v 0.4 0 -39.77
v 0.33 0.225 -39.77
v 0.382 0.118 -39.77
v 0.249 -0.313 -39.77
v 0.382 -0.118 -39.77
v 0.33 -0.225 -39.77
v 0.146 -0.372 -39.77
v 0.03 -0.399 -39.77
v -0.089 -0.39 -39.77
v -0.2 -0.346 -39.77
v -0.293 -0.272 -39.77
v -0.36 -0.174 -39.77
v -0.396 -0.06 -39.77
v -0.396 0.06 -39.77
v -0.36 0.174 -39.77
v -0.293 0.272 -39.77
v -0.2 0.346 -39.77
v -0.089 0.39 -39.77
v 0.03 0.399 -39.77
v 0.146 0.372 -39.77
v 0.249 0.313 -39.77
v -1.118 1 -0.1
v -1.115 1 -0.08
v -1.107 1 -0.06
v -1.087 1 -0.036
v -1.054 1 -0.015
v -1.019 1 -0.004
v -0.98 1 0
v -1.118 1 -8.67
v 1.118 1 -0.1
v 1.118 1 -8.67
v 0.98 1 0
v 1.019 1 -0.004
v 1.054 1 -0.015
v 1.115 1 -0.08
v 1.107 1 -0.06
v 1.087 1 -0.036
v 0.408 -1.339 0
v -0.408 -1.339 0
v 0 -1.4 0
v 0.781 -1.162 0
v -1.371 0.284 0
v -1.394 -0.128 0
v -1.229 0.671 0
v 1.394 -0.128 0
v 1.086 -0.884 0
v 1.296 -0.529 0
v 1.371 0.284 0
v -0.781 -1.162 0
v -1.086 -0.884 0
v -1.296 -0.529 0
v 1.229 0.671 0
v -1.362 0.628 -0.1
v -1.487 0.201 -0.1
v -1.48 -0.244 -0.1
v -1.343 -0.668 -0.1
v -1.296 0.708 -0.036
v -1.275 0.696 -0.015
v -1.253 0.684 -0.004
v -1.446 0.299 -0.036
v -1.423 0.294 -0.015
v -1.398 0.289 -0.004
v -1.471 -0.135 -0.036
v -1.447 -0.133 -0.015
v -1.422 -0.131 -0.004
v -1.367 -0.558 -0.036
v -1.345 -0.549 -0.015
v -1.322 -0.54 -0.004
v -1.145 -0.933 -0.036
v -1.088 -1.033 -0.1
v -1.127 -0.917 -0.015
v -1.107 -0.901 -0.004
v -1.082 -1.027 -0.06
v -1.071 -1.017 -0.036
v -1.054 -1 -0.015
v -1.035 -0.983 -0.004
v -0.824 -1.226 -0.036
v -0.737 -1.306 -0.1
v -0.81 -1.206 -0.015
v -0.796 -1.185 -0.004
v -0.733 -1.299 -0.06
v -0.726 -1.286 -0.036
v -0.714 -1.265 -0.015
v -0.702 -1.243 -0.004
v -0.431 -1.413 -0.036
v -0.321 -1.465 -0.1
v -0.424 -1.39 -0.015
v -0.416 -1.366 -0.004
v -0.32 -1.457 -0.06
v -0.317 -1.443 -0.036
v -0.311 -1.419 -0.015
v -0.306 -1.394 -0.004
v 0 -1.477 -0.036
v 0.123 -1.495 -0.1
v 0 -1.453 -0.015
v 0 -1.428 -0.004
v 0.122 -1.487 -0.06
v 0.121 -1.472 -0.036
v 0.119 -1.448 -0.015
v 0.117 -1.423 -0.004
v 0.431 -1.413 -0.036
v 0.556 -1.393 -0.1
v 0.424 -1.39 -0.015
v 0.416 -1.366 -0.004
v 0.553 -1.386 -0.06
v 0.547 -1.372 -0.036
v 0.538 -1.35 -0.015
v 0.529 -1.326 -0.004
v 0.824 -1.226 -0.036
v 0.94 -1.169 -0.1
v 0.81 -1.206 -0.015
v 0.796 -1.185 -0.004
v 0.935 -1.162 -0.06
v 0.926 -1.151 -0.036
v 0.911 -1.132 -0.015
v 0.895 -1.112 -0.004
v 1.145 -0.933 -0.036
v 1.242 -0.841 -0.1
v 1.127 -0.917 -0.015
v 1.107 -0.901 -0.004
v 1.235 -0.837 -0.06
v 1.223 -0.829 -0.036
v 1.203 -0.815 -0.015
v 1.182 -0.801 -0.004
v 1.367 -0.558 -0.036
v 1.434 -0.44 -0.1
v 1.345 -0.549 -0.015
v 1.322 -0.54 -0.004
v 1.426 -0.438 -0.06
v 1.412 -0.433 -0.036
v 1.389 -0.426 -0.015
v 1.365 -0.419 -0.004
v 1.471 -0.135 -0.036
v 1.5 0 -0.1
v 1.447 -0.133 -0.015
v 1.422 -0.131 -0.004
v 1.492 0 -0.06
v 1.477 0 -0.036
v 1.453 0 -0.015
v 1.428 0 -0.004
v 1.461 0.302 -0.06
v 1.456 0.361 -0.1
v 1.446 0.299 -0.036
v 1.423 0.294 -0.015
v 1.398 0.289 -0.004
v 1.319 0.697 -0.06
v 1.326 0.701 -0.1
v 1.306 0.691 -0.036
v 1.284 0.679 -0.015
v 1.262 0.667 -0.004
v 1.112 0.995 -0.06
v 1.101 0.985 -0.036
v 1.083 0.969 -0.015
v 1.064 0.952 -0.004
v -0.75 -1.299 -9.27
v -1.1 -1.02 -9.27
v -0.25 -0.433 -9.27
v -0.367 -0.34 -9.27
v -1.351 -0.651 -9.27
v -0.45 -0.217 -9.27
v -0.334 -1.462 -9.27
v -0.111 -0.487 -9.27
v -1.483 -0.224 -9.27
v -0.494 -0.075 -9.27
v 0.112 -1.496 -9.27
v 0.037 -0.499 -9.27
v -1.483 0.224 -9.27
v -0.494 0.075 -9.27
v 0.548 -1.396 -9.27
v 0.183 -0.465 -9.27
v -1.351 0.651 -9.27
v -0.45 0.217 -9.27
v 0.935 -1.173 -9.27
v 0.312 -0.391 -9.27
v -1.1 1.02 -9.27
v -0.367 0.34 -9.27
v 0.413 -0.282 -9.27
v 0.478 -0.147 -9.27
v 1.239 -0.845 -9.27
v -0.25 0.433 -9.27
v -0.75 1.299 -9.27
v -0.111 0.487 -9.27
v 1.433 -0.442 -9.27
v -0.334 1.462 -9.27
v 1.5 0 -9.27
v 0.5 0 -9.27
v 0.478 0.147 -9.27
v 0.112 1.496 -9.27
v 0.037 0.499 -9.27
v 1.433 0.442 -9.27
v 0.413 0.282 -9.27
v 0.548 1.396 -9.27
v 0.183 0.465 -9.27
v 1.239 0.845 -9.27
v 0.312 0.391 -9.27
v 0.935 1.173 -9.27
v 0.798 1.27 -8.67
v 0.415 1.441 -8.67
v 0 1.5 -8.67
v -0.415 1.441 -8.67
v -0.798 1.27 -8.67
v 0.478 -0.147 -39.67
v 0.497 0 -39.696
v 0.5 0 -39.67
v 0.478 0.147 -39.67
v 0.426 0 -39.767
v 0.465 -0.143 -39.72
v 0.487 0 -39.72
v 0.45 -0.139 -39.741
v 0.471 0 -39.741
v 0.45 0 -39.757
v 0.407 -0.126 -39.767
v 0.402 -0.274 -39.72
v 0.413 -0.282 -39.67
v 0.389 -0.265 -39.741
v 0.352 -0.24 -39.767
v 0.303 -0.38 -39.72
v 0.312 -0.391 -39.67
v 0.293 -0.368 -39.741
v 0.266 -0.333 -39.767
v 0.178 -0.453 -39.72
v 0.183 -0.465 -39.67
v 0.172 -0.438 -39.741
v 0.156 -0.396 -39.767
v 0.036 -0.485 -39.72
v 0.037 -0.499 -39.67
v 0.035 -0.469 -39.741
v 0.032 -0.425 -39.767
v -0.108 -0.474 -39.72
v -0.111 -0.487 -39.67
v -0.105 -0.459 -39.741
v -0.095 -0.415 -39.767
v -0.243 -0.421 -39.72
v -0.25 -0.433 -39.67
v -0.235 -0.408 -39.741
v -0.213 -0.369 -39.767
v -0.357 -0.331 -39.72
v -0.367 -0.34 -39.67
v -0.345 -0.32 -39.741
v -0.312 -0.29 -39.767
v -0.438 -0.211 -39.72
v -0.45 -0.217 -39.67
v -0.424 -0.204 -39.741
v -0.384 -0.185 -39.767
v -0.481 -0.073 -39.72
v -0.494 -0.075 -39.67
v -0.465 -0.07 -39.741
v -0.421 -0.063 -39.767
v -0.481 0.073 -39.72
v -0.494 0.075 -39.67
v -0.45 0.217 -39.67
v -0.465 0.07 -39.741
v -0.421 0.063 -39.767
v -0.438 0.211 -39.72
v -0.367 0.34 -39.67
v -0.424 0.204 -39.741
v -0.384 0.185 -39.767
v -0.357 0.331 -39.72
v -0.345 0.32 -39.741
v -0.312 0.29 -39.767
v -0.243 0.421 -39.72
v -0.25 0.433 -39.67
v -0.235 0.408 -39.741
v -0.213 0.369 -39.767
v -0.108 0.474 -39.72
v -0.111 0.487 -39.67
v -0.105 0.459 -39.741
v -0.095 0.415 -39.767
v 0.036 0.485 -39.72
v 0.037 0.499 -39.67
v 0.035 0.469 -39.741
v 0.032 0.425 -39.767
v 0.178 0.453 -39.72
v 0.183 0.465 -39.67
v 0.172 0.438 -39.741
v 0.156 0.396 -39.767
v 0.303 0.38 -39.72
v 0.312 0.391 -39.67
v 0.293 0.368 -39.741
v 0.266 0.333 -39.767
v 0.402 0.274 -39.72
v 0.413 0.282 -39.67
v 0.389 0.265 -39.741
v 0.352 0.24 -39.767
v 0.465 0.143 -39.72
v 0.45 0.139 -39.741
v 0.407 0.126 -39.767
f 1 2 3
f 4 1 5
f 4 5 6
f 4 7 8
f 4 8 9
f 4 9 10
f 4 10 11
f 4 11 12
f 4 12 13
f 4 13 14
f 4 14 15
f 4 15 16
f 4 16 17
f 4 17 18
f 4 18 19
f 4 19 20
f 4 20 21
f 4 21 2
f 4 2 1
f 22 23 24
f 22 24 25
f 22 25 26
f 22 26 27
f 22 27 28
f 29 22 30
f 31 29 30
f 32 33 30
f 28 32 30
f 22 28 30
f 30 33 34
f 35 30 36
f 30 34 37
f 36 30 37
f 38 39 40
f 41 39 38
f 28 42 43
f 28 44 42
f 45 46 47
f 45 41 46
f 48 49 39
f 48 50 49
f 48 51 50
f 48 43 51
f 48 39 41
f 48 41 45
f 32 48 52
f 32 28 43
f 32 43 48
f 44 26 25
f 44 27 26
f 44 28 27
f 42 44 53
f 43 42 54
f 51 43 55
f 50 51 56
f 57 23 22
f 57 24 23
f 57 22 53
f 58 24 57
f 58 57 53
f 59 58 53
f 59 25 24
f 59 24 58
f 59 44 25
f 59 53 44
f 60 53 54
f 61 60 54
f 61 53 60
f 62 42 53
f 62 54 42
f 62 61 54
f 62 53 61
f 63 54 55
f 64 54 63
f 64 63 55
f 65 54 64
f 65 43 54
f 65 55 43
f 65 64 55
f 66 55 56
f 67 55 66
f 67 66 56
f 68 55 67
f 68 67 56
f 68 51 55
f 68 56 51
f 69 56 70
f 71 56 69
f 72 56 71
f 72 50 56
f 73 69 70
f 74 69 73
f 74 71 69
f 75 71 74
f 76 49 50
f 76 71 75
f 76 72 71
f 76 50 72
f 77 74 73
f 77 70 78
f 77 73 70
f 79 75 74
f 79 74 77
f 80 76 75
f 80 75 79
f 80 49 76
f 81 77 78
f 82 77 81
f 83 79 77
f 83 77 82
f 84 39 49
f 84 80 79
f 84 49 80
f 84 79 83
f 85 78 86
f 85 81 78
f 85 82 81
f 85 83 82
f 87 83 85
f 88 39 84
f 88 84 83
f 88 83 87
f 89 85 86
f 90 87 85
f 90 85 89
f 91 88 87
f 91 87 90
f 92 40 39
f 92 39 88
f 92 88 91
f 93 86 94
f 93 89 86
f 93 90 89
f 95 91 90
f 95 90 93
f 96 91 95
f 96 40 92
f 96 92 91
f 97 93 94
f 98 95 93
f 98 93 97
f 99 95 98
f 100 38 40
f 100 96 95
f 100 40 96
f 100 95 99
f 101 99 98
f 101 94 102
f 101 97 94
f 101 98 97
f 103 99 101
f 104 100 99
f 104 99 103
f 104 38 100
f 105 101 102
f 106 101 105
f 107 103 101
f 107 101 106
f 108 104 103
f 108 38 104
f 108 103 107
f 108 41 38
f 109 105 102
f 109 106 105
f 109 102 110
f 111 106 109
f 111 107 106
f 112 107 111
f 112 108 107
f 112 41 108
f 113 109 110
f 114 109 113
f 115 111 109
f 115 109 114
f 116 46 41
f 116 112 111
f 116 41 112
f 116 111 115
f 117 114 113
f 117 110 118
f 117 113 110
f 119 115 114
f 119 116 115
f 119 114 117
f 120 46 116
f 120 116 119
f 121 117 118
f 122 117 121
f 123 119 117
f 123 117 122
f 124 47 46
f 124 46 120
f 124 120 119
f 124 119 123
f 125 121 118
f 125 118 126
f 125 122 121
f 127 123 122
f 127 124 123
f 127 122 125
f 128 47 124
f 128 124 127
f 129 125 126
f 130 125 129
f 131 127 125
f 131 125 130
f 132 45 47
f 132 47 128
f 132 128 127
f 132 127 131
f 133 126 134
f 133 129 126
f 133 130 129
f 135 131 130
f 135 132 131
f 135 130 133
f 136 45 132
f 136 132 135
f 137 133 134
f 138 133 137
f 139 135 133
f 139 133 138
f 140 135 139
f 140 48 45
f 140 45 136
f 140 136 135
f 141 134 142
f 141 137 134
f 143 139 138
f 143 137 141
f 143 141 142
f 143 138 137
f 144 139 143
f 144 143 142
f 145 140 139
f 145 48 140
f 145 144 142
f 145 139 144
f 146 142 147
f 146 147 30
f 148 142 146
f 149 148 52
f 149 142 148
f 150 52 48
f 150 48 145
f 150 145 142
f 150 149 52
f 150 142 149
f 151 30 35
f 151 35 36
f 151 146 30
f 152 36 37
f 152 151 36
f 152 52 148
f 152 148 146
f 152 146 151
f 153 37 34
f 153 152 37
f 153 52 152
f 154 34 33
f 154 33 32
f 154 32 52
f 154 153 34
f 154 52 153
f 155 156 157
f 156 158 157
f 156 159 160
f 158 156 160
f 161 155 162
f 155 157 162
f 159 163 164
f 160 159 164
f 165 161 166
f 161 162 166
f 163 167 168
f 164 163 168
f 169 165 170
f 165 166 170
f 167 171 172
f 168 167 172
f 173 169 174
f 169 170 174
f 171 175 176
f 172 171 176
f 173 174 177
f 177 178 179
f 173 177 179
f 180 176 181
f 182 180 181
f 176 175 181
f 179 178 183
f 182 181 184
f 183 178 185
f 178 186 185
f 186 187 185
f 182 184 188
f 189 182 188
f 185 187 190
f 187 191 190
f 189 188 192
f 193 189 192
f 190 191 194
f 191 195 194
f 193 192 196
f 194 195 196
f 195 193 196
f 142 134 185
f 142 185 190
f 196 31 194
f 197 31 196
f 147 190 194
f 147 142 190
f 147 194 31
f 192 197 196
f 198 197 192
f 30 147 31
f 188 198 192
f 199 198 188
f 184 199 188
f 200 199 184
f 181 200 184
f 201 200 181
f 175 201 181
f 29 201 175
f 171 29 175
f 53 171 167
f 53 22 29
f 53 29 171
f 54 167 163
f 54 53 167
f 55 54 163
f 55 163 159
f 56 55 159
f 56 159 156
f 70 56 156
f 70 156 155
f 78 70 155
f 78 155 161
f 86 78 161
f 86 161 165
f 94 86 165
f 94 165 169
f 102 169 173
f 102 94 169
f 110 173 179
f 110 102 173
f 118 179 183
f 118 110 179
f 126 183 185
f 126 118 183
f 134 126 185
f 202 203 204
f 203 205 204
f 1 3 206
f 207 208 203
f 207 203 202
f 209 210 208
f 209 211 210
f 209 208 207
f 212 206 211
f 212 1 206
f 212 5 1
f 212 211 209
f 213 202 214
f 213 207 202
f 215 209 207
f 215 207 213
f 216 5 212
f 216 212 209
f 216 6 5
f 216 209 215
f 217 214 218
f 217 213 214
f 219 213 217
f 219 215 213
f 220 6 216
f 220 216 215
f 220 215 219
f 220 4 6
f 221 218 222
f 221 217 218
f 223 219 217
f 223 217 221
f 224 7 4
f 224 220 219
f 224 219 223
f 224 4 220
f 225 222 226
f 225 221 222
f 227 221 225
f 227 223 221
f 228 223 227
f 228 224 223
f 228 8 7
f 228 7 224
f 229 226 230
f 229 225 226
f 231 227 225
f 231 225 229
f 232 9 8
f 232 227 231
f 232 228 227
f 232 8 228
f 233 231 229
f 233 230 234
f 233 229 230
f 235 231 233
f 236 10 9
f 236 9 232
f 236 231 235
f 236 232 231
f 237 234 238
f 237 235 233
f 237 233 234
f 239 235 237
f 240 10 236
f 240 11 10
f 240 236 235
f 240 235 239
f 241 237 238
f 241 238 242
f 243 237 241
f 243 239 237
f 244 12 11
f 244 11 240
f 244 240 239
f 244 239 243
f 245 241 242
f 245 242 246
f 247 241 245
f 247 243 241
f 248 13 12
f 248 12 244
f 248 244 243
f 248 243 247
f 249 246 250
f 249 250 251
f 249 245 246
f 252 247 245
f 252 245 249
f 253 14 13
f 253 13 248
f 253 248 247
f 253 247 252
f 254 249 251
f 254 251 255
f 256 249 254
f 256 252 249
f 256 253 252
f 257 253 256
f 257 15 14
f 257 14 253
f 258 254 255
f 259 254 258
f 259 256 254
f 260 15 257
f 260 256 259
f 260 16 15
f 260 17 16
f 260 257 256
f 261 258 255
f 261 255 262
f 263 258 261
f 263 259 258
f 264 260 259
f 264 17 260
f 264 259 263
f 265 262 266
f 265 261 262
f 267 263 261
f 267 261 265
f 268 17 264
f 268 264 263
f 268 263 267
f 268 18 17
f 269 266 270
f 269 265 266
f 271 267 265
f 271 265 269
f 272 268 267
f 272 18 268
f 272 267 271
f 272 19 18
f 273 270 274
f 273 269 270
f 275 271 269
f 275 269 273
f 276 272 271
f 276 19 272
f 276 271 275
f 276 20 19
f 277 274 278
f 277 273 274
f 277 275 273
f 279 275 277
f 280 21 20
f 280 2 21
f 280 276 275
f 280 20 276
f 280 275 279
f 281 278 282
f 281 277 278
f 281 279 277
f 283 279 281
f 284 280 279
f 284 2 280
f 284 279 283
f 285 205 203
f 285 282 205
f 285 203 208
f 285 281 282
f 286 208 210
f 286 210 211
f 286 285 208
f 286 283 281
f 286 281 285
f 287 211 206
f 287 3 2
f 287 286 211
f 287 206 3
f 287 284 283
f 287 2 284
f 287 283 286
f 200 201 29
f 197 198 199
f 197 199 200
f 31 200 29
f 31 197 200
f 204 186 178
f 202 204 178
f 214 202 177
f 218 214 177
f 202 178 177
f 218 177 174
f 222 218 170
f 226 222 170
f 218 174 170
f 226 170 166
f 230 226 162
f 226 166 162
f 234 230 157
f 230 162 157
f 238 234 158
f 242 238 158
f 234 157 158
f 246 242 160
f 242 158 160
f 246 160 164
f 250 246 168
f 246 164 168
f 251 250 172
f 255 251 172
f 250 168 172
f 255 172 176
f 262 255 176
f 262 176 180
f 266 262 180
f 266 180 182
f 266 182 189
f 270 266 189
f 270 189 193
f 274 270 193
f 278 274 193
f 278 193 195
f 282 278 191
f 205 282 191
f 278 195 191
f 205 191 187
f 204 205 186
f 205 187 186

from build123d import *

# Parameters (mm, degrees)
SKETCH1_R           = 1.5
BOSS_EXTRUDE1_DEPTH = 9.27
CUT_EXTRUDE1_DEPTH  = 8.67
SKETCH3_R           = 0.5
BOSS_EXTRUDE2_DEPTH = 30.5
FILLET1_R           = 0.1


with BuildPart() as part:
    # Sketch1 → Boss-Extrude1 (new body)
    with BuildSketch(Plane.XY):
        Circle(SKETCH1_R)
    extrude(amount=-BOSS_EXTRUDE1_DEPTH)

    # Sketch2 → Cut-Extrude1 (cut)
    with BuildSketch(Plane.XY):
        with BuildLine():
            Line((-1.118033989, 1), (1.118033989, 1))
            ThreePointArc((1.118033989, 1), (0, 1.5), (-1.118033989, 1))
        make_face()
    extrude(amount=-CUT_EXTRUDE1_DEPTH, mode=Mode.SUBTRACT)

    # Sketch3 → Boss-Extrude2 (add)
    with BuildSketch(Plane(origin=(0, 0, -9.27), x_dir=(-1, 0, 0), z_dir=(0, 0, -1))):
        with Locations(Location((0, 0, 0), (0, 0, 180))):
            Circle(SKETCH3_R)
    extrude(amount=BOSS_EXTRUDE2_DEPTH)

    # Fillet1
    fillet1_edges = [part.edges().sort_by_distance(p)[0] for p in [
        (-0.5, 0, -39.77),
        (-0.535233135, -1.401258538, 0),
    ]]
    fillet(fillet1_edges, radius=FILLET1_R)


solid = part.part
